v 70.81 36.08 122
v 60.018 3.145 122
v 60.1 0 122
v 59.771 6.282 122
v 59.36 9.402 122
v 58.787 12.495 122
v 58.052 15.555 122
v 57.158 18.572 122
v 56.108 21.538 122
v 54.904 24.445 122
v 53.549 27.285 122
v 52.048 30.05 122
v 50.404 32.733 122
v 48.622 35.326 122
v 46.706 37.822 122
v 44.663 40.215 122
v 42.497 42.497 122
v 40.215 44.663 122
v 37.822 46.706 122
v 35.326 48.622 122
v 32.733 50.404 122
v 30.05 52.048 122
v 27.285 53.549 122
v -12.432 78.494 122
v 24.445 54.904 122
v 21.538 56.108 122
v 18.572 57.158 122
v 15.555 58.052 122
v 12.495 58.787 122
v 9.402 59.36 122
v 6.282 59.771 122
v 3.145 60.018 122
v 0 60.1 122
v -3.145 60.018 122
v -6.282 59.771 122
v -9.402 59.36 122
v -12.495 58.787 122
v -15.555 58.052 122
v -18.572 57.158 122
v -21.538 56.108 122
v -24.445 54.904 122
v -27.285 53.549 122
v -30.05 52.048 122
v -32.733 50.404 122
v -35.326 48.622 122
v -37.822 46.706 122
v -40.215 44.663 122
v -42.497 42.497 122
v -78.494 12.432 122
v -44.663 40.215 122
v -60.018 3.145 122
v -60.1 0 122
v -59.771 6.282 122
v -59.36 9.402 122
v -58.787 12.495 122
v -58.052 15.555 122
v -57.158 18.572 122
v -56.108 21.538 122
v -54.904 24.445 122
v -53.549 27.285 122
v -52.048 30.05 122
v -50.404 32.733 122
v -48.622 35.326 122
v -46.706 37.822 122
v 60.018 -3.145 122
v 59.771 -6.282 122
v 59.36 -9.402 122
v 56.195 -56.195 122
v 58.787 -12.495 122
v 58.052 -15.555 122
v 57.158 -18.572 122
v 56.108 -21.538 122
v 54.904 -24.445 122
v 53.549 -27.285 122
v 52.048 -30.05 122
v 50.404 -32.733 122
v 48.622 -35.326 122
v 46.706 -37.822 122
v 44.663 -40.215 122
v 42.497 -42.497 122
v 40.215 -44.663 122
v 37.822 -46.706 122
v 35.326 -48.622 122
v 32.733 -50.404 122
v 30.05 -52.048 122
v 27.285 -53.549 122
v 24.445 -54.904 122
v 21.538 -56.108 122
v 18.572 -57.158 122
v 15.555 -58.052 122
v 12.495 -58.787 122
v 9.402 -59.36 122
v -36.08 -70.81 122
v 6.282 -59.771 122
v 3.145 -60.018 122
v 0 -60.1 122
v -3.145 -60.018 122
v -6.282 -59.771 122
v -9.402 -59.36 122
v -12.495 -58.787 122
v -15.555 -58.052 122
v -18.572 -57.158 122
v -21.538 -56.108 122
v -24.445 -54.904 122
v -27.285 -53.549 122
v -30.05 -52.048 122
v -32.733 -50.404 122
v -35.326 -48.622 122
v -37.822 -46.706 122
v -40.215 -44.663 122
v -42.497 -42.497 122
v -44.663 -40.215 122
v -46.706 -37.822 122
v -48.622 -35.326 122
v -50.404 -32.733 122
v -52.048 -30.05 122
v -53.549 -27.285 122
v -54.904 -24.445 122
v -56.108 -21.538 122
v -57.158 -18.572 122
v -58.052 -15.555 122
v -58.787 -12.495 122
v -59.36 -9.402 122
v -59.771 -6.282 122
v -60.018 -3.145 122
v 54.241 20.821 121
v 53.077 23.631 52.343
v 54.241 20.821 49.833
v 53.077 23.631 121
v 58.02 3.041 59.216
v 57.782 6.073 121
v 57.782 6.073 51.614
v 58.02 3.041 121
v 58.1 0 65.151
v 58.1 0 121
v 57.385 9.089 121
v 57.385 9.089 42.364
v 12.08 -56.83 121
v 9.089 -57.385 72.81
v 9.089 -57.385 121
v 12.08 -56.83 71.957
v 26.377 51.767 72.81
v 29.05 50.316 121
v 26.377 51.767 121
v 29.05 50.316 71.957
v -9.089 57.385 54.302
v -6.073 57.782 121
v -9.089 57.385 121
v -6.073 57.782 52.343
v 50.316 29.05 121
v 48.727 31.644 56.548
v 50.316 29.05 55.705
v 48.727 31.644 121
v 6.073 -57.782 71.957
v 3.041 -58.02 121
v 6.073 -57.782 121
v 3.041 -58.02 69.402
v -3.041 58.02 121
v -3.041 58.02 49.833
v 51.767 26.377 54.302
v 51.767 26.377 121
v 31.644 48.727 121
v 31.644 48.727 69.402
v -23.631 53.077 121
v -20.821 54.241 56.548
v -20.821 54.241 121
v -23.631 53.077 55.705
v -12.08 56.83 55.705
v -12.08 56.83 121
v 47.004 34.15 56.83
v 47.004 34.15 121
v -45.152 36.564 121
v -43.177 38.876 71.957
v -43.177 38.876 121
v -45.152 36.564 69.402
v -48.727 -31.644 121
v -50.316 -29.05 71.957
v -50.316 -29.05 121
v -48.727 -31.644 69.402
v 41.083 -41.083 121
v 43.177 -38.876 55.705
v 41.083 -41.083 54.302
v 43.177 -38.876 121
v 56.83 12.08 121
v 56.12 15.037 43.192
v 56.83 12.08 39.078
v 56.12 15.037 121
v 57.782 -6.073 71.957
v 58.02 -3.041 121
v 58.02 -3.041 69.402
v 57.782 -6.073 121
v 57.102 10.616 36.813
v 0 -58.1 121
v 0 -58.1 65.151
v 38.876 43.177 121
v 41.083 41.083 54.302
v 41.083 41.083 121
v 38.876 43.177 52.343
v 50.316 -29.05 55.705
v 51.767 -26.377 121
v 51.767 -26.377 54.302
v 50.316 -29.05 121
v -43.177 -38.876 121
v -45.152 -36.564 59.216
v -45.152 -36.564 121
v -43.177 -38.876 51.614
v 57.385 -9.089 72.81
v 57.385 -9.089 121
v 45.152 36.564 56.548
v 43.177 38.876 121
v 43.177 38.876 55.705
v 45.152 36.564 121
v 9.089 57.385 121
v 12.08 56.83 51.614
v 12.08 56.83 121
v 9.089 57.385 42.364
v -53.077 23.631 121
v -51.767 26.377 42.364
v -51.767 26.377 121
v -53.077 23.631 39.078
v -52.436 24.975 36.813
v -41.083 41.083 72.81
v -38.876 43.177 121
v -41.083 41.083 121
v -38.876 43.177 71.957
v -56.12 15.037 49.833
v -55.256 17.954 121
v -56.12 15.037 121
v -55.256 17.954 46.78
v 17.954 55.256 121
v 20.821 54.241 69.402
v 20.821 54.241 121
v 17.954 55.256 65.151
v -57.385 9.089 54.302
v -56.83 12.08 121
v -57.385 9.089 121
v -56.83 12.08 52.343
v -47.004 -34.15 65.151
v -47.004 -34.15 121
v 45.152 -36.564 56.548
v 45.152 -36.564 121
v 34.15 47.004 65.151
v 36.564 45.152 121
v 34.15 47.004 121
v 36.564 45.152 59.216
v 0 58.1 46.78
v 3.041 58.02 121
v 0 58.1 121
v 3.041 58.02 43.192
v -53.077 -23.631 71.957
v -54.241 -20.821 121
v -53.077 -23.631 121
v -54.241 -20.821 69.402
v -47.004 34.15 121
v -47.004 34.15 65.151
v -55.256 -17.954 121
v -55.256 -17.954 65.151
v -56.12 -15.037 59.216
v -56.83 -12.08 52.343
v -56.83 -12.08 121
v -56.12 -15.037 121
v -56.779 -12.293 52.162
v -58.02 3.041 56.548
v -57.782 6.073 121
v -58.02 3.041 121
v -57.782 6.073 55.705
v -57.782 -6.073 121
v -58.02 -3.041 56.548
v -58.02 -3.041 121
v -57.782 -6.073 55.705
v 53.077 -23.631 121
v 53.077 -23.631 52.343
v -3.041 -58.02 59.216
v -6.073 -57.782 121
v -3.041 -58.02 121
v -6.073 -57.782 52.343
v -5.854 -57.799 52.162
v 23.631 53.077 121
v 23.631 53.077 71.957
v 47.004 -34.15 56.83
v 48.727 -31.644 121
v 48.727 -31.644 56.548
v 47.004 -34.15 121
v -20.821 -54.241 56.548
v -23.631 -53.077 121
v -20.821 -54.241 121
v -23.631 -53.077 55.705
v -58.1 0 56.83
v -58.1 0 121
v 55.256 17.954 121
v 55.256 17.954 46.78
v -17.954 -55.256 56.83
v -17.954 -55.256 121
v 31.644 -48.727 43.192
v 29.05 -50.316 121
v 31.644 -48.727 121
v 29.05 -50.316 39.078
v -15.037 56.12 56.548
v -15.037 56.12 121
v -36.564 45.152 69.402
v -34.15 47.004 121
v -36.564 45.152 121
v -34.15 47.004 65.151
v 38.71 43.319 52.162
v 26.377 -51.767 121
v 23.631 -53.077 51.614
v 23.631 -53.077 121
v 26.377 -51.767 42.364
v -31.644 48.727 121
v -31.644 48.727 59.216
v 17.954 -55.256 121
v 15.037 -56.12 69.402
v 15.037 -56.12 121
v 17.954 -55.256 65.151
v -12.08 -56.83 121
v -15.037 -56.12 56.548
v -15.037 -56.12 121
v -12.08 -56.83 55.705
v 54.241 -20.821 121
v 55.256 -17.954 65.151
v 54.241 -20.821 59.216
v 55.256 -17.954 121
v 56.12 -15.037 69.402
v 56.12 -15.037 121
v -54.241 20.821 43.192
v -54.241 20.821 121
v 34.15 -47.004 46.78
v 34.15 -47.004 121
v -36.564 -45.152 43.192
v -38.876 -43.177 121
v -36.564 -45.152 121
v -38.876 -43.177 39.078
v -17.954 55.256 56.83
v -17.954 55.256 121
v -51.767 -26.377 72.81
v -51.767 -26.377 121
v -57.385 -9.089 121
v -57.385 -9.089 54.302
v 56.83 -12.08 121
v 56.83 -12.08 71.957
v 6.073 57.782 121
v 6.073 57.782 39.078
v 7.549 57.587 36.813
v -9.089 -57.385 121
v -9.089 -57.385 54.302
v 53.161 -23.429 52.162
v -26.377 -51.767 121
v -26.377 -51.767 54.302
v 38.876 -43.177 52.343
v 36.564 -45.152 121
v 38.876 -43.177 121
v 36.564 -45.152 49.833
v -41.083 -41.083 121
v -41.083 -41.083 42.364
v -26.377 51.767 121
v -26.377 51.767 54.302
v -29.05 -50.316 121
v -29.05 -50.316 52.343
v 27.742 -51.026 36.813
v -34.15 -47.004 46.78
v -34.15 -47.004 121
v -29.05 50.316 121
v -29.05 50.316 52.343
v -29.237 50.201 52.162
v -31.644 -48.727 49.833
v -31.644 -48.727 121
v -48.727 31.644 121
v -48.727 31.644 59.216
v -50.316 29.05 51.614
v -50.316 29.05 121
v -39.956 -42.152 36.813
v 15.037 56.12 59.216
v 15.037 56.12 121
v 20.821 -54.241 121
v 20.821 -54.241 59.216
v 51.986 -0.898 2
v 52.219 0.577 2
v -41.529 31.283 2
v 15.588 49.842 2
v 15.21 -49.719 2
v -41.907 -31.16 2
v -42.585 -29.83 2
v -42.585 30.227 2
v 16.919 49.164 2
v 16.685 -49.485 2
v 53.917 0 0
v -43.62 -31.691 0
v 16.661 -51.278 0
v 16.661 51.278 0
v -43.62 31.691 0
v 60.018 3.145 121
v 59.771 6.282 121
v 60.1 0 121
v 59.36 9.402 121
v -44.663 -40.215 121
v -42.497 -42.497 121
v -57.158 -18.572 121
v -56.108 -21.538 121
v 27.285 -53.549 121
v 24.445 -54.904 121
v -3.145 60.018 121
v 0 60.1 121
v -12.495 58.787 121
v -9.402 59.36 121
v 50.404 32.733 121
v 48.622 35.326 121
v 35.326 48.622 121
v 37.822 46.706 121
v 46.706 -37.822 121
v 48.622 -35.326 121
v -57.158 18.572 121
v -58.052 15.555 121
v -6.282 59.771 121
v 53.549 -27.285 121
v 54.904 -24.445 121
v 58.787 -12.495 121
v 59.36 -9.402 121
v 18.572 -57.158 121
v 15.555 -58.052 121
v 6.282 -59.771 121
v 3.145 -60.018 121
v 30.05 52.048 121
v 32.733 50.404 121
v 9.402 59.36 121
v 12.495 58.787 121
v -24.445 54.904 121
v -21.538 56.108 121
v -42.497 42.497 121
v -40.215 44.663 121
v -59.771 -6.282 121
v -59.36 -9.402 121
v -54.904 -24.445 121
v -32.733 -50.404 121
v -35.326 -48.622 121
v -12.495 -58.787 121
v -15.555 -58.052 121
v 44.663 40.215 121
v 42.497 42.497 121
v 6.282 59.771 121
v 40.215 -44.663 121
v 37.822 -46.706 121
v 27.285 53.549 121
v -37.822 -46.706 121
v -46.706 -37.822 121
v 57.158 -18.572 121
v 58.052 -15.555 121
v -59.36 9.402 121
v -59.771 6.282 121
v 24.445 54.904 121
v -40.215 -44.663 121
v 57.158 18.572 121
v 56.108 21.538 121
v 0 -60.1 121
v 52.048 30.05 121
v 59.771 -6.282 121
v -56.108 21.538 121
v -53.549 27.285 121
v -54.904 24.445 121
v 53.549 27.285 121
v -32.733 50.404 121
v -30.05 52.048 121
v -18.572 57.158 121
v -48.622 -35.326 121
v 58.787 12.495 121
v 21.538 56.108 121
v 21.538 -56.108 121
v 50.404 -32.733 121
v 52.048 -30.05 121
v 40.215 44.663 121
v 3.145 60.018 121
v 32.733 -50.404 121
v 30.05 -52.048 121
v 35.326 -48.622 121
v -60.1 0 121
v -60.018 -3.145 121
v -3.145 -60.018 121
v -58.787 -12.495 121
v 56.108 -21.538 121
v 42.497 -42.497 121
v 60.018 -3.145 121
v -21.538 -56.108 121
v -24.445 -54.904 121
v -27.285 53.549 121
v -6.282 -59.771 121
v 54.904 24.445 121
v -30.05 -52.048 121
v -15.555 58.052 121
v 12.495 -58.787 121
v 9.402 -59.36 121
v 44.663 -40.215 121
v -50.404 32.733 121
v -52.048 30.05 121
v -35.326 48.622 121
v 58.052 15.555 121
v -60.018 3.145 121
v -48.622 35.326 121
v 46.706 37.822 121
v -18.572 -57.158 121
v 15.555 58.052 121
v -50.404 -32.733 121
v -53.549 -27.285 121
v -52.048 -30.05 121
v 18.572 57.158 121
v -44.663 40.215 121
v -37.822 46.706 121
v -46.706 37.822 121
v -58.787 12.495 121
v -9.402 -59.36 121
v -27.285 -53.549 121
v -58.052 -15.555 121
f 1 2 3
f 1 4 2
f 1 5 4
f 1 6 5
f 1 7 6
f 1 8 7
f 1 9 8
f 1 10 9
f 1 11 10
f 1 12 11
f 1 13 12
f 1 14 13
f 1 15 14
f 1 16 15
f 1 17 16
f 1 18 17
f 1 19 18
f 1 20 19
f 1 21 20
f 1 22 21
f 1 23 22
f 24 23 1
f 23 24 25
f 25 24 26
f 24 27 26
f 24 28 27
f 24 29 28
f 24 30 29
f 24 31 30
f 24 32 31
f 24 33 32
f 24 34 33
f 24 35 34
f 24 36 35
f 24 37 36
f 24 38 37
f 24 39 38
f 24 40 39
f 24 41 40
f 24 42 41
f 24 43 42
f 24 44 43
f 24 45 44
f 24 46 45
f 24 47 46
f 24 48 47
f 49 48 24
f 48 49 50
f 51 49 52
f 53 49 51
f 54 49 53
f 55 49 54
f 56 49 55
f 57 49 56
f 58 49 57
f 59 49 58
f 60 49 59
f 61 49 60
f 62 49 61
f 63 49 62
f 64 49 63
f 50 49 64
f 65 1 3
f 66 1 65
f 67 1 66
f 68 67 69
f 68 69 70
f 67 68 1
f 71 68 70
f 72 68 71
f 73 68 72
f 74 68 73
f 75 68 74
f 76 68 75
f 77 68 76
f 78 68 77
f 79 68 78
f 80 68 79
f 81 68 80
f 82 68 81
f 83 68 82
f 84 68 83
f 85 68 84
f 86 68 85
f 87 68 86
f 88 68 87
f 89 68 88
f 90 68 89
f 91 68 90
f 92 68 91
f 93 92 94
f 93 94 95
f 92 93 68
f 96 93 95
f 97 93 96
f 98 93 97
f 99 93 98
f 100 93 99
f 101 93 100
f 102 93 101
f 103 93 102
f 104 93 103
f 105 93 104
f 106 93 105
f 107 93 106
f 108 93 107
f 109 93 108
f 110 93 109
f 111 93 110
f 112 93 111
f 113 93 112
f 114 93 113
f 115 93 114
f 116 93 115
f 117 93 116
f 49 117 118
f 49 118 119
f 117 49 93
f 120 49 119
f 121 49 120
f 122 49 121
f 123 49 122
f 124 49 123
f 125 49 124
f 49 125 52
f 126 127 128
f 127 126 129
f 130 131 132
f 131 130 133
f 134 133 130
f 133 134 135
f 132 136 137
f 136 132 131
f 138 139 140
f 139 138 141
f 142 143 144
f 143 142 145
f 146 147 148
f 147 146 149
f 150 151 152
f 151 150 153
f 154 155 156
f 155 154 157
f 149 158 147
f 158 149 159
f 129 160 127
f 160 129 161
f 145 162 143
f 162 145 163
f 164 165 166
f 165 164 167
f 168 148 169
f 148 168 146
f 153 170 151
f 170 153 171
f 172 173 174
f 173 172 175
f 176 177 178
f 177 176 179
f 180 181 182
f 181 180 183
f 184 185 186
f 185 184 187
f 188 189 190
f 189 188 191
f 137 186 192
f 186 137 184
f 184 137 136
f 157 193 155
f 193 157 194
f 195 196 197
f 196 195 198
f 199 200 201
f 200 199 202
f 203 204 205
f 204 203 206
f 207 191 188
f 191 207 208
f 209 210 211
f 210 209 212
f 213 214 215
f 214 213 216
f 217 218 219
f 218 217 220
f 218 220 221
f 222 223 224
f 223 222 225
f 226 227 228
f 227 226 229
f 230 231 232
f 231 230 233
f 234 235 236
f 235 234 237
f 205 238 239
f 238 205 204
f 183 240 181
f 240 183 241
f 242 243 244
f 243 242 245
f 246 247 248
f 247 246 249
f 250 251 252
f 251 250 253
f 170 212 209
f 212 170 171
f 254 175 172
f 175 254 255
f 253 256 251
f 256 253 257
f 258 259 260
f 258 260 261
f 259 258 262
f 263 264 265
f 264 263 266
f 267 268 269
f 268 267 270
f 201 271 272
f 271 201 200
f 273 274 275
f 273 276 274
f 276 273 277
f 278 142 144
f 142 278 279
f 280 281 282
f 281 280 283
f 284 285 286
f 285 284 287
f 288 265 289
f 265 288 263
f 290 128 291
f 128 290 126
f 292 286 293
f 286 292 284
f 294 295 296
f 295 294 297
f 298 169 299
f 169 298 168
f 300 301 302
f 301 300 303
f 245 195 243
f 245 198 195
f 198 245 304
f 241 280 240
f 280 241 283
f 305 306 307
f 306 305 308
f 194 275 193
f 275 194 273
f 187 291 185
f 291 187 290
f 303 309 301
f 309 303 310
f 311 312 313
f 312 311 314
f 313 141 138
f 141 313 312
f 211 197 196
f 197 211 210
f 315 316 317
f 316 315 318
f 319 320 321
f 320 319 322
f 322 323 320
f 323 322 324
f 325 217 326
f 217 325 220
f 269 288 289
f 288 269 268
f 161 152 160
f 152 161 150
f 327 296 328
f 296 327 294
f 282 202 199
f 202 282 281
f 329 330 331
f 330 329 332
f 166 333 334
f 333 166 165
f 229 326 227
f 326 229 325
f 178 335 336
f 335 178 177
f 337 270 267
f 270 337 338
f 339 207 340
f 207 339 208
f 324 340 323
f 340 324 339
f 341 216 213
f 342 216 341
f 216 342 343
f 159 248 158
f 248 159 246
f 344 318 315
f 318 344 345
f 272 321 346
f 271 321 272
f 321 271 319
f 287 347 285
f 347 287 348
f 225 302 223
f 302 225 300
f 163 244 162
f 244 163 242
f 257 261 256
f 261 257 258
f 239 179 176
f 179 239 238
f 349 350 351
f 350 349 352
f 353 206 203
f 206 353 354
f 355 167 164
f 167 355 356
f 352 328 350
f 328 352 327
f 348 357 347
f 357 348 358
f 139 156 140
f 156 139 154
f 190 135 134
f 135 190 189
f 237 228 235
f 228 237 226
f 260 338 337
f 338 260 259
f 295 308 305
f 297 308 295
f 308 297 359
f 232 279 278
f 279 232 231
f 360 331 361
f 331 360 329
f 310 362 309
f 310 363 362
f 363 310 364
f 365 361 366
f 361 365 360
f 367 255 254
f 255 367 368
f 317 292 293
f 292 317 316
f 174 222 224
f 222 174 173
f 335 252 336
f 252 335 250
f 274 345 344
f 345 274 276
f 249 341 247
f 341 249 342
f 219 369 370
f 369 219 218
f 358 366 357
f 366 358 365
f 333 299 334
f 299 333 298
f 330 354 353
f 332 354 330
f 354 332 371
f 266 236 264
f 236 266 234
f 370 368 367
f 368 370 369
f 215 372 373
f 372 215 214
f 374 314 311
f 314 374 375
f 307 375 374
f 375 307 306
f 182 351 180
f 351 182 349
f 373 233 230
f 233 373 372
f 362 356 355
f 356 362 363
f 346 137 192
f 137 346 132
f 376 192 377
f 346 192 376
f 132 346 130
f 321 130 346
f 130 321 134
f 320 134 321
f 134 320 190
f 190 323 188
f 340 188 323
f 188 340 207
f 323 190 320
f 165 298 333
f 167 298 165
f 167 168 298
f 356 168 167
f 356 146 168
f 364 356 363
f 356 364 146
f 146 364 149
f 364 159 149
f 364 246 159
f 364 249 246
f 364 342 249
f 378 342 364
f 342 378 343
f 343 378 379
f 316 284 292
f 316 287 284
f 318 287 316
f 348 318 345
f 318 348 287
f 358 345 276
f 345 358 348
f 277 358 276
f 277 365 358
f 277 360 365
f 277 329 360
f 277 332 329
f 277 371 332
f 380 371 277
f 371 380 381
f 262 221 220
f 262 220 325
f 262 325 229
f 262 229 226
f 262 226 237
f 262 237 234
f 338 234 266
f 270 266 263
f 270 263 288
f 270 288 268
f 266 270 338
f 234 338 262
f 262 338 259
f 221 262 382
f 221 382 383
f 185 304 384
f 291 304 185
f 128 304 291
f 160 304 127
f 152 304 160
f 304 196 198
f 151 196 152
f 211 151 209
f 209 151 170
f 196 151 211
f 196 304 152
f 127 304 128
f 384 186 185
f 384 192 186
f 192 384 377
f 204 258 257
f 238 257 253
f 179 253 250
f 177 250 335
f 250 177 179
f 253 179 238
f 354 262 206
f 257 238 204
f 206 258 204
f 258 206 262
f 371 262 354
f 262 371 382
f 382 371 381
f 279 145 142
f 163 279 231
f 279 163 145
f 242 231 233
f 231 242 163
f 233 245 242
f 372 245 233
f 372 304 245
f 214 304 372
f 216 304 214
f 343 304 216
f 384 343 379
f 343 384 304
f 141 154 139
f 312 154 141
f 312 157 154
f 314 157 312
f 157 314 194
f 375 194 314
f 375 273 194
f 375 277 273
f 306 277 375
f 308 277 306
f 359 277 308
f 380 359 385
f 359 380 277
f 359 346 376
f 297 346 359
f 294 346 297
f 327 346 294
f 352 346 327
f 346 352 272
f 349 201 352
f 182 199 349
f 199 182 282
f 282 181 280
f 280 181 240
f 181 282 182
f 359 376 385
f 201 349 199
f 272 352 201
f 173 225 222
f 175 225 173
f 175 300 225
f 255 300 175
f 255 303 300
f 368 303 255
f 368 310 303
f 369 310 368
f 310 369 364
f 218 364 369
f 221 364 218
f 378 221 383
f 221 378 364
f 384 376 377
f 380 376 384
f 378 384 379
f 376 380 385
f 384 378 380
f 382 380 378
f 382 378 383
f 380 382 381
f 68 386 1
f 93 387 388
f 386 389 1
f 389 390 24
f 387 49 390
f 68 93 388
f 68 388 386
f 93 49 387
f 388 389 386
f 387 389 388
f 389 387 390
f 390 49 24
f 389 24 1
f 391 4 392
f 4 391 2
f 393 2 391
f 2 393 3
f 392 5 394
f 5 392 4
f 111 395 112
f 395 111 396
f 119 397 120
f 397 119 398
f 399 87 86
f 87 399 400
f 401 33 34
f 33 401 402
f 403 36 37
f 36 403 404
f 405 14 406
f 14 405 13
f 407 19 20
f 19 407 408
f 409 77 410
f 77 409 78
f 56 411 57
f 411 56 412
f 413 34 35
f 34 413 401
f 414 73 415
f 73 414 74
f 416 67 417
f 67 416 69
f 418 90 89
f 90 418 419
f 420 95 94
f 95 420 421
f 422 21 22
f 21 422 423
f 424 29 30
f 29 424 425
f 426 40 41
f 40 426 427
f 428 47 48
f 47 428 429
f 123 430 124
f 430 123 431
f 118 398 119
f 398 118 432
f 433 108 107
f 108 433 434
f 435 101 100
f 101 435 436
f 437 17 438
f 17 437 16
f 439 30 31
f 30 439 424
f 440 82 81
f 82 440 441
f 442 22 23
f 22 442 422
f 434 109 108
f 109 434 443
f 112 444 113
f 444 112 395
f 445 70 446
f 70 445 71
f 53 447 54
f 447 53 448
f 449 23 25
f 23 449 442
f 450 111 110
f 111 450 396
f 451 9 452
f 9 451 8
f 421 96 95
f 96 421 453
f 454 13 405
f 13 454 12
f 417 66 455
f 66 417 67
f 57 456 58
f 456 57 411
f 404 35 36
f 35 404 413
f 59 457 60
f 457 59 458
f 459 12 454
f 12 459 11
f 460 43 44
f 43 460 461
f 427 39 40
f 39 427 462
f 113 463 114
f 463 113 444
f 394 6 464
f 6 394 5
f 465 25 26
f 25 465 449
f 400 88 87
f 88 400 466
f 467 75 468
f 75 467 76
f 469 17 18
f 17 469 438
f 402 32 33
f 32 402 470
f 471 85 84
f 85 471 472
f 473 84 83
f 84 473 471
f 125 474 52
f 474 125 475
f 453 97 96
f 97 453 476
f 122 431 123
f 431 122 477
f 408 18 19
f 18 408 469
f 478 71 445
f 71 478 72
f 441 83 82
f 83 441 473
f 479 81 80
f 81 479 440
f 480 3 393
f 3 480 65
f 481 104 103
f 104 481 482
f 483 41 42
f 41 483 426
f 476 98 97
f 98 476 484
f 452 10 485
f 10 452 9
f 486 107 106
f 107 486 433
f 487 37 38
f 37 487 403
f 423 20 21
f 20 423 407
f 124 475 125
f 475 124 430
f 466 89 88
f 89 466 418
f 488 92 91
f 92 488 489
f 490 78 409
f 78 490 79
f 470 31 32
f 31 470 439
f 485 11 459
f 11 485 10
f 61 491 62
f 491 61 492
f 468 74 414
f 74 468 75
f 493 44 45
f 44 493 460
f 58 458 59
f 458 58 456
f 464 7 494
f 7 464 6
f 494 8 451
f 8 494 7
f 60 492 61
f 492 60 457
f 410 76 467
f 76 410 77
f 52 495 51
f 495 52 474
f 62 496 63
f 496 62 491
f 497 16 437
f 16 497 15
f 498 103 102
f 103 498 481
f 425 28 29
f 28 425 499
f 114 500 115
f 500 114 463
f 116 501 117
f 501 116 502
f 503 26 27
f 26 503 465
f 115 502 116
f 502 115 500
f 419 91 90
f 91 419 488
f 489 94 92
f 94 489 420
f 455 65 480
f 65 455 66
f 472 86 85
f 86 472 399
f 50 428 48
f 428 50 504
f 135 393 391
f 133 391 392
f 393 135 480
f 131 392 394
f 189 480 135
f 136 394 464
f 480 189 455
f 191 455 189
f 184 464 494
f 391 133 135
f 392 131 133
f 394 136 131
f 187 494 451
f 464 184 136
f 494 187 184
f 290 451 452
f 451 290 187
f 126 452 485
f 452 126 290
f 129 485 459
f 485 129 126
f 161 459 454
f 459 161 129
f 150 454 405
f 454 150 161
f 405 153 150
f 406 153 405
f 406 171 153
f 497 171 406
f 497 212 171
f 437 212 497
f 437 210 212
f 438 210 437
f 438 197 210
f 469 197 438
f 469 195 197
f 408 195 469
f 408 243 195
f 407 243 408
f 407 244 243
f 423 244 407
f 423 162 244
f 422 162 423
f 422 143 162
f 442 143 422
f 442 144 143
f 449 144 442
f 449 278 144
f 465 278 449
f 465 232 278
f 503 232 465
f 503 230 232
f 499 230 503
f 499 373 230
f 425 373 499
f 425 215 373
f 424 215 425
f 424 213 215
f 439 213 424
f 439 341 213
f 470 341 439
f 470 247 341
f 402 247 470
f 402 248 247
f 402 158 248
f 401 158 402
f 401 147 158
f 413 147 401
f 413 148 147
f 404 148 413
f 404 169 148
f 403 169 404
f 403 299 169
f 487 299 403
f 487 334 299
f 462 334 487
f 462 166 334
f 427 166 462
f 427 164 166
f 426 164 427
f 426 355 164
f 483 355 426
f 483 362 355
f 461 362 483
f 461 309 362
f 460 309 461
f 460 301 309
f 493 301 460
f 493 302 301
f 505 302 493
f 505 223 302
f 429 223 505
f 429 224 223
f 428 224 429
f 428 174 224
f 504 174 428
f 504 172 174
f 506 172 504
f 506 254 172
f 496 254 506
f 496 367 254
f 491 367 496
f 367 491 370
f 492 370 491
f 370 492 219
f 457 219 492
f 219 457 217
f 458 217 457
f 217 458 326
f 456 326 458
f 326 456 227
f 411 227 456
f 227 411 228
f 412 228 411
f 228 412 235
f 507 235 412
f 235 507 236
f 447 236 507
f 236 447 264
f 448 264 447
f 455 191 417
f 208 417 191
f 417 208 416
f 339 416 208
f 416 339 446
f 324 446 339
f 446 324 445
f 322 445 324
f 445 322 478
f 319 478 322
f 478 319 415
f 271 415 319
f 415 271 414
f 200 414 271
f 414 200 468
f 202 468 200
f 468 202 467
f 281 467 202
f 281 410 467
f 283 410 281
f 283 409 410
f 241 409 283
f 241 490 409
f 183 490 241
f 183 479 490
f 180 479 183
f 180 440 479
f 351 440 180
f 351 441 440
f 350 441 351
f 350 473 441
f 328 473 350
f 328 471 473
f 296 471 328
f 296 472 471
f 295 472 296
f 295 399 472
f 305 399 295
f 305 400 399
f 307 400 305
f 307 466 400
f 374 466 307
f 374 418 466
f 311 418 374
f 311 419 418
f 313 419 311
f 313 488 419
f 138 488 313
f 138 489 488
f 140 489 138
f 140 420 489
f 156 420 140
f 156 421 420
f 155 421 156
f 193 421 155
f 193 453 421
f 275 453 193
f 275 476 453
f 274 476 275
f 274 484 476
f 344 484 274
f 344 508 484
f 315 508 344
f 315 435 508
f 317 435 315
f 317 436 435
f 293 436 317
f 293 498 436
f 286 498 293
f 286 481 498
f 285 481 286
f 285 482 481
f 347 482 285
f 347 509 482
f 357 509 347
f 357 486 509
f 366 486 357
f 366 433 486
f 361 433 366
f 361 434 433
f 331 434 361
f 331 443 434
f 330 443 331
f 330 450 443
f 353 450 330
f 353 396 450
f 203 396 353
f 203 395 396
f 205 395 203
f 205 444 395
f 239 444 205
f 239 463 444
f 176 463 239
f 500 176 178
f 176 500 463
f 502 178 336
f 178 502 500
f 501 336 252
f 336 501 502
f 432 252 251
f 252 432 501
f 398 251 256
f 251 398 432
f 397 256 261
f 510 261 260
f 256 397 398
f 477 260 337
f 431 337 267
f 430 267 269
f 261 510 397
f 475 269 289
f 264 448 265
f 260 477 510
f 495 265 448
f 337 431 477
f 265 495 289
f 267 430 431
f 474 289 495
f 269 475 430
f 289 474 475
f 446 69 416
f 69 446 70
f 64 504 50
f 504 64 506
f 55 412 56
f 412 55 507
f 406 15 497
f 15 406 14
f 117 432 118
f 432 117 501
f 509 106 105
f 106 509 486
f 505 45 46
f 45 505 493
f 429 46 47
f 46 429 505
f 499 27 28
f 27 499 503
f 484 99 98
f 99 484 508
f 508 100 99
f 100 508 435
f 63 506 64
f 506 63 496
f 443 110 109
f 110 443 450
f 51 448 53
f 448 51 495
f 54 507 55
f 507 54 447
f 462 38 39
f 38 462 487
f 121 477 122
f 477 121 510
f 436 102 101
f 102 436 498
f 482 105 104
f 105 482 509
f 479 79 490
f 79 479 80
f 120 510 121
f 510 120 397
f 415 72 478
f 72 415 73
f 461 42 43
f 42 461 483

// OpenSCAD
////////////   parametric pot   ///////////



//bracket radius
bracket_r=58.1;
//bracket heigh (including lip)
bracket_h=24;       //including lip
//bottom radius
insert_r_bot=41.75;
//how high is the insert
insert_h=108;
//(total_h= insert_h+bot_thick+drainage_h) prevents root rot
drainage_h=12;//[0:30]

//extra radius of lip (bracket r + lip = top r)
lip_dr=2;
//lip height
lip=1;
//radius tolerance (0=tight fit)
tol=1;//[0:5]

//wall thickness, recommend at least 4x extrusion width
wall=1.6;
//thickness of bottom wall
bot_thick=2;


//circle fragment angle (5, low value for best fit)
insert_fa=3;  
//low poly fan? this is your friend
sides=5;
twist=45;
//low poly fan? 0.01-low poly, 3-smooth(will take years to compile)
slice_factor=0.01;

//adds to bracket radius, will expand the top if lip is too long. default=0
inflation_dr=0;




////////////////////////////////////////////

all_h=insert_h+drainage_h+bot_thick;
r1=(insert_r_bot+tol);
r2=bracket_r+tol+.01+inflation_dr;
hi=((bot_thick+drainage_h)-((r1/r2)*(all_h-bracket_h)))/((r1/r2)-1);

l_r_top=(((hi+all_h)/(hi+all_h-bracket_h))*bracket_r);
l_r_bottom=(((hi+bot_thick+drainage_h)/(hi+all_h-bracket_h))*bracket_r);




///////////////////////////////////
difference(){
    difference(){
        shell(all_h,l_r_bottom+wall,l_r_top+wall,sides);
        difference(){
            shell(all_h,l_r_bottom,l_r_top,sides);
            cylinder(h=bot_thick,r=l_r_bottom*2);
            difference(){
                cylinder(h=all_h,r=2*l_r_top);
                cylinder(h=all_h,r=bracket_r,$fa=insert_fa);}
                }
        }
    translate([0,0,all_h-lip]) cylinder(h=lip,r=bracket_r+lip_dr,$fa=insert_fa);
}

///////////////////////////////////
module shell(h,r_bottom,r_top,n_sides){
    linear_extrude(height=h,scale=r_top/r_bottom,,twist=twist,slices=all_h*slice_factor)
        circle(r_bottom/cos(180/n_sides),$fn=n_sides);
}
